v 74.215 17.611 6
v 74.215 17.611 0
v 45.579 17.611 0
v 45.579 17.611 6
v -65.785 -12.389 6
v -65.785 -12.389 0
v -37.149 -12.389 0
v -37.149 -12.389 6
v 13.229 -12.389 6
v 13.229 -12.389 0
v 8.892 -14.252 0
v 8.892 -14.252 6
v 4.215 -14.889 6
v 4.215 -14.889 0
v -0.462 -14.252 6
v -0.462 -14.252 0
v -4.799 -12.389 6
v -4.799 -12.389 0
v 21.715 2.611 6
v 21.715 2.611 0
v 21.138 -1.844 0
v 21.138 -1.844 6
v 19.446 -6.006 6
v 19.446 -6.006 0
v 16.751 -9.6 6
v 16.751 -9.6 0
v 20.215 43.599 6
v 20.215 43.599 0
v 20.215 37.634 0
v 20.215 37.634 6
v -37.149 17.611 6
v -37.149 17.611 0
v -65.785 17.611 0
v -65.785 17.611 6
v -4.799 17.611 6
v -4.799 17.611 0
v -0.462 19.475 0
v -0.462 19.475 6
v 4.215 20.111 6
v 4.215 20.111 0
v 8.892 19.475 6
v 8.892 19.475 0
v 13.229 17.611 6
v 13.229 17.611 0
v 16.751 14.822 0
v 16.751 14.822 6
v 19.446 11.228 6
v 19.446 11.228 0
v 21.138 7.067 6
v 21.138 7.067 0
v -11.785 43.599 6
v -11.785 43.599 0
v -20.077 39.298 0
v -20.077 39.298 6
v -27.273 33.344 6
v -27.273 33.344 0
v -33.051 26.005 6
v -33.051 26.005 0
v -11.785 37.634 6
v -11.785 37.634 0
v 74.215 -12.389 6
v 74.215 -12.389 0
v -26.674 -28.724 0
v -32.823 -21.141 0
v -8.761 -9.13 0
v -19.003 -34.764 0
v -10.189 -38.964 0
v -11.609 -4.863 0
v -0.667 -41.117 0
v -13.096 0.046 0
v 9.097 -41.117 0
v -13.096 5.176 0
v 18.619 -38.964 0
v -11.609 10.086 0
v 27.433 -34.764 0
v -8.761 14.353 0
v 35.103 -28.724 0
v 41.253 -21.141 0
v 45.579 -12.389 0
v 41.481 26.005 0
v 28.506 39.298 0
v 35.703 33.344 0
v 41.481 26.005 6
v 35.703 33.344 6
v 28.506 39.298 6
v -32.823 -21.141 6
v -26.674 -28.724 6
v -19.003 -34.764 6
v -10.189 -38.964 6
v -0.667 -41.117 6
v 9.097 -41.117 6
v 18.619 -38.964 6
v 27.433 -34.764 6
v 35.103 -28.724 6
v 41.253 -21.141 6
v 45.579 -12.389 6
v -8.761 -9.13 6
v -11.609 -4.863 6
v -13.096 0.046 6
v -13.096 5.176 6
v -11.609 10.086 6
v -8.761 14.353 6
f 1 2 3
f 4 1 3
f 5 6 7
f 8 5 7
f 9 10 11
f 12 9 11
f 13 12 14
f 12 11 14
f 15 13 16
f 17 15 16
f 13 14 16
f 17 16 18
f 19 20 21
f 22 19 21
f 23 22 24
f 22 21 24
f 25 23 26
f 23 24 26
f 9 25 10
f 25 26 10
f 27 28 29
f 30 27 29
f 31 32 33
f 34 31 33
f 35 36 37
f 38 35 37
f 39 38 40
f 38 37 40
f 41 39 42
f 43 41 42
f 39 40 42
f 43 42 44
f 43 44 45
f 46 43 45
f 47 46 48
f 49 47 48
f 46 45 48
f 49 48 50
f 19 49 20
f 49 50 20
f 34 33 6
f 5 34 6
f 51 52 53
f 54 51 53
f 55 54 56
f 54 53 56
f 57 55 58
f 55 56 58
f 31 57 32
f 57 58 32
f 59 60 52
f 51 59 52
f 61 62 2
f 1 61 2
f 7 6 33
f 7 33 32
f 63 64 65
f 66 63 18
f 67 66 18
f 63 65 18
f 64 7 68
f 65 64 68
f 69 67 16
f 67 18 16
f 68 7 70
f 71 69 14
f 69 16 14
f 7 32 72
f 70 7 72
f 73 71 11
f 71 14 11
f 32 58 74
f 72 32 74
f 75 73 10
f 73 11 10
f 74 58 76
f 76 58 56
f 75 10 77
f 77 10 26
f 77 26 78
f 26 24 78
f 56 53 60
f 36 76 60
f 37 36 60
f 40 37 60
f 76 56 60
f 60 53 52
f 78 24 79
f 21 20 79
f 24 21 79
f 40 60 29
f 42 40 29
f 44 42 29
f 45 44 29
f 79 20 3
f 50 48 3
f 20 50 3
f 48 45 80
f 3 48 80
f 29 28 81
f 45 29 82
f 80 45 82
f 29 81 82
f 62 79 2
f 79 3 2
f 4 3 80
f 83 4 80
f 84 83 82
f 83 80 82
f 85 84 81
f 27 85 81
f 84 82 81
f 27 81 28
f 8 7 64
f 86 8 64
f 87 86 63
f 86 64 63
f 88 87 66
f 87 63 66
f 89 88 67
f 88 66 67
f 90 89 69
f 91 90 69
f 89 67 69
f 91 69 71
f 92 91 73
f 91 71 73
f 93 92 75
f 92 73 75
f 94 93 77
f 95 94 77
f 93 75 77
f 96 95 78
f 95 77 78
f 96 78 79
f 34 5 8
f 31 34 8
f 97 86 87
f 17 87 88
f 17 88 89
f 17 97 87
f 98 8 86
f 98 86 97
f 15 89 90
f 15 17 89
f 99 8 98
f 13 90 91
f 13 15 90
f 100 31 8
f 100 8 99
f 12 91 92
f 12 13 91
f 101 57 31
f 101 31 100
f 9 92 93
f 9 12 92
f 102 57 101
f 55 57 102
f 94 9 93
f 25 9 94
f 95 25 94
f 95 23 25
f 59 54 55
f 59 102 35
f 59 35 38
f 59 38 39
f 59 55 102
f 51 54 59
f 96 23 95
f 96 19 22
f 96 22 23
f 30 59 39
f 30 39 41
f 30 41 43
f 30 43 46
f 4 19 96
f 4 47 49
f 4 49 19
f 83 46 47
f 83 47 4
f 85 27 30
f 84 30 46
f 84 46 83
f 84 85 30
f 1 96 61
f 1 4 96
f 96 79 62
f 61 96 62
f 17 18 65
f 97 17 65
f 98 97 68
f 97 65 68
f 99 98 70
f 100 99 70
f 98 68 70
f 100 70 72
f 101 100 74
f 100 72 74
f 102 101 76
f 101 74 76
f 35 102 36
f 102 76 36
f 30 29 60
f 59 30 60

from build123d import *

# Parameters (mm, degrees)
F1_DEPTH = 6


with BuildPart() as f1:
    # F0 (on Top) → F1 (new body)
    with BuildSketch(Plane.XY):
        with BuildLine():
            ThreePointArc((-37.1493010532, -12.3887201771), (-39.7850652933, 2.6112798229), (-37.1493010532, 17.6112798229))
            Line((-37.1493010532, 17.6112798229), (-65.7850652933, 17.6112798229))
            Line((-65.7850652933, 17.6112798229), (-65.7850652933, -12.3887201771))
            Line((-65.7850652933, -12.3887201771), (-37.1493010532, -12.3887201771))
        make_face()
        with BuildLine():
            ThreePointArc((-4.798943482, -12.3887201771), (-13.2850652933, 2.6112798229), (-4.798943482, 17.6112798229))
            Line((-4.798943482, 17.6112798229), (-37.1493010532, 17.6112798229))
            ThreePointArc((-37.1493010532, 17.6112798229), (-39.7850652933, 2.6112798229), (-37.1493010532, -12.3887201771))
            Line((-37.1493010532, -12.3887201771), (-4.798943482, -12.3887201771))
        make_face()
        with BuildLine():
            ThreePointArc((13.2288128953, 17.6112798229), (19.4463638632, 11.2283307018), (21.7149347067, 2.6112798229))
            ThreePointArc((21.7149347067, 2.6112798229), (19.4463638632, -6.005771056), (13.2288128953, -12.3887201771))
            Line((13.2288128953, -12.3887201771), (45.5791704666, -12.3887201771))
            ThreePointArc((45.5791704666, -12.3887201771), (47.5509842119, -5.0036274833), (48.2149347067, 2.6112798229))
            ThreePointArc((48.2149347067, 2.6112798229), (47.5509842119, 10.2261871291), (45.5791704666, 17.6112798229))
            Line((45.5791704666, 17.6112798229), (13.2288128953, 17.6112798229))
        make_face()
        with BuildLine():
            Line((74.2149347067, 17.6112798229), (45.5791704666, 17.6112798229))
            ThreePointArc((45.5791704666, 17.6112798229), (47.5509842119, 10.2261871291), (48.2149347067, 2.6112798229))
            ThreePointArc((48.2149347067, 2.6112798229), (47.5509842119, -5.0036274833), (45.5791704666, -12.3887201771))
            Line((45.5791704666, -12.3887201771), (74.2149347067, -12.3887201771))
            Line((74.2149347067, -12.3887201771), (74.2149347067, 17.6112798229))
        make_face()
        with BuildLine():
            ThreePointArc((-4.798943482, 17.6112798229), (4.2149347067, 20.1112798229), (13.2288128953, 17.6112798229))
            Line((13.2288128953, 17.6112798229), (45.5791704666, 17.6112798229))
            ThreePointArc((45.5791704666, 17.6112798229), (35.703112855, 33.3439112901), (20.2149347067, 43.5990828867))
            Line((20.2149347067, 43.5990828867), (20.2149347067, 37.6344849233))
            Line((20.2149347067, 37.6344849233), (-11.7850652933, 37.6344849233))
            Line((-11.7850652933, 37.6344849233), (-11.7850652933, 43.5990828867))
            ThreePointArc((-11.7850652933, 43.5990828867), (-27.2732434416, 33.3439112901), (-37.1493010532, 17.6112798229))
            Line((-37.1493010532, 17.6112798229), (-4.798943482, 17.6112798229))
        make_face()
        with BuildLine():
            Line((45.5791704666, -12.3887201771), (13.2288128953, -12.3887201771))
            ThreePointArc((13.2288128953, -12.3887201771), (4.2149347067, -14.8887201771), (-4.798943482, -12.3887201771))
            Line((-4.798943482, -12.3887201771), (-37.1493010532, -12.3887201771))
            ThreePointArc((-37.1493010532, -12.3887201771), (4.2149347067, -41.3887201771), (45.5791704666, -12.3887201771))
        make_face()
    extrude(amount=F1_DEPTH)


solid = f1.part
